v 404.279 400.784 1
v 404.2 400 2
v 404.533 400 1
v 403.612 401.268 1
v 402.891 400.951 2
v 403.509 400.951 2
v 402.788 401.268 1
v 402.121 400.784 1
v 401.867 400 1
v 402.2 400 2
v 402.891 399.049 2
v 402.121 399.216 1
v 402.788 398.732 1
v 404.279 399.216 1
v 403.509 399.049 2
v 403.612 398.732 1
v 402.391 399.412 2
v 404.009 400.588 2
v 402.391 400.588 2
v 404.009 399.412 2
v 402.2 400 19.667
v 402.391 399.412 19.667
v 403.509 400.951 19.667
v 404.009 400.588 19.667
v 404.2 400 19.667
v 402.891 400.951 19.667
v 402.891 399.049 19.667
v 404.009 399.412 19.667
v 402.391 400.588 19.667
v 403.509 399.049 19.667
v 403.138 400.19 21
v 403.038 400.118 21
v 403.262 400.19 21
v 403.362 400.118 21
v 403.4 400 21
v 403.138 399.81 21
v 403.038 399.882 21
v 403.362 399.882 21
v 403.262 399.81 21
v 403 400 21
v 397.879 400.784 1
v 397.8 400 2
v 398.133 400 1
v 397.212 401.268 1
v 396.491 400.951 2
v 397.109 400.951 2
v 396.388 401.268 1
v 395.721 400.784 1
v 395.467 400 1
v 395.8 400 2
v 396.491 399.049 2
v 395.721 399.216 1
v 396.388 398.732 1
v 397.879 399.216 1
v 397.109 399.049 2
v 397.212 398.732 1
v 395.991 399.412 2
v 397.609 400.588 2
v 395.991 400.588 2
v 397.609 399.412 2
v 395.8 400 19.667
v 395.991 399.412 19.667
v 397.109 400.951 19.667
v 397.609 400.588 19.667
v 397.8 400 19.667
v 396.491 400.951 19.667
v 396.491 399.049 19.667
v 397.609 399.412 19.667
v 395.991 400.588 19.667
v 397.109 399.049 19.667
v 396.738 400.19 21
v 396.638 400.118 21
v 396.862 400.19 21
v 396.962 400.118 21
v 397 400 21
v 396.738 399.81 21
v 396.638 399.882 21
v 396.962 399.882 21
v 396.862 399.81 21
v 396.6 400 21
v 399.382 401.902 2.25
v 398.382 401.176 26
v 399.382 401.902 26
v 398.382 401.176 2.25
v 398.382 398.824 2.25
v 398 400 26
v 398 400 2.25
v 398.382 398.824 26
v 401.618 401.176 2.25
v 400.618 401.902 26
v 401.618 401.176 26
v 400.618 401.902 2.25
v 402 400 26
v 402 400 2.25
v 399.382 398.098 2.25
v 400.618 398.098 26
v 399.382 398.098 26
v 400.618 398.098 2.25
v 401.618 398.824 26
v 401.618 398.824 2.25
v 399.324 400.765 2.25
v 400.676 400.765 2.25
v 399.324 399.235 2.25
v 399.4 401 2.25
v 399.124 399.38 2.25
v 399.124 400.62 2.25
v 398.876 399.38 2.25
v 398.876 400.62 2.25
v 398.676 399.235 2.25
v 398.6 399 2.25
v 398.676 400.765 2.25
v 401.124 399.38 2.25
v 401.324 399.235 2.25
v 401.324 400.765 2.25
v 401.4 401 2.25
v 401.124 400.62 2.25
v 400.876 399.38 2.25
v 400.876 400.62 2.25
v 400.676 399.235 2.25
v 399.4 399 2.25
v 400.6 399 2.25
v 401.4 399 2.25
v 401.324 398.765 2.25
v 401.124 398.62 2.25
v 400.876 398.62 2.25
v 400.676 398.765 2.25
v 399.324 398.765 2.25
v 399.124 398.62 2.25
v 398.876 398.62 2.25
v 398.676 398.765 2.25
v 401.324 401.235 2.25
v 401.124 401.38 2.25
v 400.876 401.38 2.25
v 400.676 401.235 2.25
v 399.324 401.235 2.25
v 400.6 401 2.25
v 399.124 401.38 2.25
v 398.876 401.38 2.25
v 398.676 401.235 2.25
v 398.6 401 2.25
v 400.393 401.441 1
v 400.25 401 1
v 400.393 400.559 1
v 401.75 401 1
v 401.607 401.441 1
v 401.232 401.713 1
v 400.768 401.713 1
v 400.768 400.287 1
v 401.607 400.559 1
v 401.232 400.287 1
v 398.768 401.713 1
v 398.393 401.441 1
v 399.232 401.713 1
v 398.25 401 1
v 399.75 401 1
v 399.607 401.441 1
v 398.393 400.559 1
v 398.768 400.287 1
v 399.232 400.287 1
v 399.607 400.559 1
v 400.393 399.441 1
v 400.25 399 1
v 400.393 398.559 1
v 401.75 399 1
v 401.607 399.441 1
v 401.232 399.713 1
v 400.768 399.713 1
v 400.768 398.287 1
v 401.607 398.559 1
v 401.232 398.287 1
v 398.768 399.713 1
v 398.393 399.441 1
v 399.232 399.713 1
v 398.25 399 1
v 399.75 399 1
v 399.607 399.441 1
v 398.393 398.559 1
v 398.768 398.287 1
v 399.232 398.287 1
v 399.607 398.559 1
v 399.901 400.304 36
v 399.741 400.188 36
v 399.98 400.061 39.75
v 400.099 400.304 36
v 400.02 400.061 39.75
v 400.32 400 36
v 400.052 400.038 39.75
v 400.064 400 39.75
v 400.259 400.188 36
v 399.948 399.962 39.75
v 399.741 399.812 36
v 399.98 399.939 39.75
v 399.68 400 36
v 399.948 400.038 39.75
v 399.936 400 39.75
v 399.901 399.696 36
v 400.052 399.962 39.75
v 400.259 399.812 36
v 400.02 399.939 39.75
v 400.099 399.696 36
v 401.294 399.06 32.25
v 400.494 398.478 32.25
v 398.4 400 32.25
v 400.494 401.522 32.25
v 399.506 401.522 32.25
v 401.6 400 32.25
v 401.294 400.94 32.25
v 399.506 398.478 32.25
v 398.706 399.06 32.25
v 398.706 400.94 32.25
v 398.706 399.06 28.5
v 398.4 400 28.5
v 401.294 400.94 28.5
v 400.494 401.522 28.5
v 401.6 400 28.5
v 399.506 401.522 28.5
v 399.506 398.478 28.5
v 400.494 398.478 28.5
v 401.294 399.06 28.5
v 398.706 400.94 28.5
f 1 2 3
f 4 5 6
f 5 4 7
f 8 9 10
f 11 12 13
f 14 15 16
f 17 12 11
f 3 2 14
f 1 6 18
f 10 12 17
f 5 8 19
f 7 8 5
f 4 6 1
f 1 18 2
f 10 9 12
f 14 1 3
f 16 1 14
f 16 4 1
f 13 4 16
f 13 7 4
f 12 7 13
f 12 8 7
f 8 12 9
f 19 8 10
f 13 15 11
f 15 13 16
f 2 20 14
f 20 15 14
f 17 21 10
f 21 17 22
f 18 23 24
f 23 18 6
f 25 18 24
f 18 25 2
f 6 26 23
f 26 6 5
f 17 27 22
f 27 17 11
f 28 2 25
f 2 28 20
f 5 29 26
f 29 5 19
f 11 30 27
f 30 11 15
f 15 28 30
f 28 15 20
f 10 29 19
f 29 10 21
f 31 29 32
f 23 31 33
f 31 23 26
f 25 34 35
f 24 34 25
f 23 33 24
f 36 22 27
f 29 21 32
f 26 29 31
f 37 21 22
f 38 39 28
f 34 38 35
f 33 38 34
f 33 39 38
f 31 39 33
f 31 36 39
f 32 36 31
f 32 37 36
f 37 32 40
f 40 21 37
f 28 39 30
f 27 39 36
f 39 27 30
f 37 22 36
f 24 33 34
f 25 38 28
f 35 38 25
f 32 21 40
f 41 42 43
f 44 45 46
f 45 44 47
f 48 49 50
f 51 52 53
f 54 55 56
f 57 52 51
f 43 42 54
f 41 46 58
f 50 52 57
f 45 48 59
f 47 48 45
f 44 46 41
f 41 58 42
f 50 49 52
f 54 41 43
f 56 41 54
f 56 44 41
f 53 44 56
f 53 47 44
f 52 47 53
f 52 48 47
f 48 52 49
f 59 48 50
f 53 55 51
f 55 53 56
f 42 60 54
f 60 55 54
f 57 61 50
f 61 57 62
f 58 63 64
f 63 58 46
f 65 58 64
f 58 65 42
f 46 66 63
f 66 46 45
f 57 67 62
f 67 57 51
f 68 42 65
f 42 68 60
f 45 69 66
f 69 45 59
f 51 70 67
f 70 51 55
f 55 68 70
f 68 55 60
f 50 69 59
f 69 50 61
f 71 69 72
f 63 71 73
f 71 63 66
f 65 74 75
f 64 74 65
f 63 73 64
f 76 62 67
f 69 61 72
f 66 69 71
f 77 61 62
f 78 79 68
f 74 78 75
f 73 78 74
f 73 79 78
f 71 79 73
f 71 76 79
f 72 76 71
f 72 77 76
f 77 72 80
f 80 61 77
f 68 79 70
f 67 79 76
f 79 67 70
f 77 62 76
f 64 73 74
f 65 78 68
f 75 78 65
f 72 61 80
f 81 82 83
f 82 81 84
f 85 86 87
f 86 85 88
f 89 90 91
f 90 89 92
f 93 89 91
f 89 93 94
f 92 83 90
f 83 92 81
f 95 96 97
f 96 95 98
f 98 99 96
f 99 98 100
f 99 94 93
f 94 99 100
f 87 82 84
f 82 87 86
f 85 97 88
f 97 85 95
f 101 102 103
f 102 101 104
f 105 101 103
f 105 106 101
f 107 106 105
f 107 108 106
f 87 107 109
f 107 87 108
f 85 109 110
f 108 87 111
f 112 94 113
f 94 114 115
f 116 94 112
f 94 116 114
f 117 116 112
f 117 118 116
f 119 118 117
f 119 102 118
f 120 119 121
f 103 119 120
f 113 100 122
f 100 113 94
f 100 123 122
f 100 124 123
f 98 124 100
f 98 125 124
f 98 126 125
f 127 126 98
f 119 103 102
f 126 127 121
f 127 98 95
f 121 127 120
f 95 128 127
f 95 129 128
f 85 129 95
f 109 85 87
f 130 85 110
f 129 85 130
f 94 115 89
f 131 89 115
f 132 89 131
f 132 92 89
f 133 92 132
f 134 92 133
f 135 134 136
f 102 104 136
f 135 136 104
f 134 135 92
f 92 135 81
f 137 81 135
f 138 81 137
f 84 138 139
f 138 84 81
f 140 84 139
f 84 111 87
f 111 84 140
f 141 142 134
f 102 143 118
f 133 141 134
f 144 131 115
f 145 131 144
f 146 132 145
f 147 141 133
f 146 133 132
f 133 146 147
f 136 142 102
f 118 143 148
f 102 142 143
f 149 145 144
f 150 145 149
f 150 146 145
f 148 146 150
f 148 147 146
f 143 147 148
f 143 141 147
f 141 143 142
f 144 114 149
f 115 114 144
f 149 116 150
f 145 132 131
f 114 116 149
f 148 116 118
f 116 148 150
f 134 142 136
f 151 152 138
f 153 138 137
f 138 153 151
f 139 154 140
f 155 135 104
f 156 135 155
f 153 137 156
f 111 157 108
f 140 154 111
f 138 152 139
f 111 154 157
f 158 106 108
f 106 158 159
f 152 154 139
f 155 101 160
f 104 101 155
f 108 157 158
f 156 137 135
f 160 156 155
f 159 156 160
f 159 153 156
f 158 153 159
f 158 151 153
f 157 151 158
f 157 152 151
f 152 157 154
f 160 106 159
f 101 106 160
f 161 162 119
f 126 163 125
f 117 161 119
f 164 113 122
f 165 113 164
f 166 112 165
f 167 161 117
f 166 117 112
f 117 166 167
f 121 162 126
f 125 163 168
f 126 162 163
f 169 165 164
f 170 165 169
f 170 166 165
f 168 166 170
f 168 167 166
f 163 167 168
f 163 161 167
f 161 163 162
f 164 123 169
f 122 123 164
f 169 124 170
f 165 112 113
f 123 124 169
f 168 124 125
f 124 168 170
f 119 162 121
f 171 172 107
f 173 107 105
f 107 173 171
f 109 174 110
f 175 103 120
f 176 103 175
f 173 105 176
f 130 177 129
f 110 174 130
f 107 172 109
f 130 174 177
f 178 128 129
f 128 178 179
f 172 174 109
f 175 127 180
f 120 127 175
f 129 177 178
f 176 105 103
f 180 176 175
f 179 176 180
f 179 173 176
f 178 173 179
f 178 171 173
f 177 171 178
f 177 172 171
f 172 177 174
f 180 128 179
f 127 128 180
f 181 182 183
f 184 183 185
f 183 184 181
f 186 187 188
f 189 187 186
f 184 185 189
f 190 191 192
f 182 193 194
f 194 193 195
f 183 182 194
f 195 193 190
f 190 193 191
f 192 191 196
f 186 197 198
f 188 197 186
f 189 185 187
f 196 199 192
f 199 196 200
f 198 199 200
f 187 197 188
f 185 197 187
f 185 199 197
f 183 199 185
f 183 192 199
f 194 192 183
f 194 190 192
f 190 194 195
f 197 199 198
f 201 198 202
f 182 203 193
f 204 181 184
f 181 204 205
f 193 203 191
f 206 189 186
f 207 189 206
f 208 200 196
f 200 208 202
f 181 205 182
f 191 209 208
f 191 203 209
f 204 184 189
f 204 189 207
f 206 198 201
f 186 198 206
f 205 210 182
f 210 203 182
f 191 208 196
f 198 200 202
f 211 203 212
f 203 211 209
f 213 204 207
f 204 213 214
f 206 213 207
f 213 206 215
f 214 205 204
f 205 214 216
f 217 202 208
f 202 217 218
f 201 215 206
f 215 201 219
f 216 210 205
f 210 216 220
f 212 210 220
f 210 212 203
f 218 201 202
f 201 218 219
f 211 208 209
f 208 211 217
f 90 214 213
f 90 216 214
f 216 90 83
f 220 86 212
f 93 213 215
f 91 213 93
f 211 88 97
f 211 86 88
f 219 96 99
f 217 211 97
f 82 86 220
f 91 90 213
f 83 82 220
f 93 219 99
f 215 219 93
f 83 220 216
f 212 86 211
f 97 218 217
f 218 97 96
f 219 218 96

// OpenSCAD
$fn = 10;

room_size_x = 80;
room_size_y = 80;
room_size_z = 80;
module room(){
union(){
translate([-room_size_x,0,0])
cube([room_size_x,1,room_size_z]);
translate([0,-room_size_y,0])
cube([1,room_size_y,room_size_z]);
translate([-room_size_x,-room_size_y,0])
cube([room_size_x,room_size_y,1]);
}
}

module booster(h, r) {
// cone + tube + cone
 booster_bottom_h = h/20;
 booster_pointy_h = h/15;
 tube_h = h - booster_bottom_h - booster_pointy_h;
 
 union(){
 color("grey")
 cylinder(booster_bottom_h,r+r/3,r); 
 
 color("white") 
 translate([0,0,booster_bottom_h])
 cylinder(tube_h,r,r);
 
 color("white")
 translate([0,0,booster_bottom_h+tube_h])
 cylinder(booster_pointy_h, r, r*0.2);
 }
};

module core_orion_connector(h, r1, r2){
   color("darkorange")
   cylinder(h, r1, r2);
}

module core_stage(h, r) {
 // motors + fuel cylinder
 motors_h = h/20;
 pre_motors_h = h/10;
 core_tube_h = h - motors_h - pre_motors_h;
 
 translate([0,0,motors_h])
 union(){
 translate([0,0,pre_motors_h]){
 color("orange")
 cylinder(core_tube_h,r,r);
 }
 color("white")
 cylinder(pre_motors_h, r,r);
 }
 
 // 4x engines
 union(){
 translate([r/2,r/2,0])
 rs_25_engine(motors_h, r/5);
  translate([-r/2,r/2,0])
 rs_25_engine(motors_h, r/5);
  translate([r/2,-r/2,0])
 rs_25_engine(motors_h, r/5);
  translate([-r/2,-r/2,0])
 rs_25_engine(motors_h, r/5);
 }
};

module rs_25_engine(h,r) {
   color([0.2,0.2,0.2])
   cylinder(h,r+0.35,r);
};

module orion(h,r1,r2) {
  orion_conn_h = h*0.5;
  orion_base_h = h - orion_conn_h;
  
  color("white")
  union(){
    translate([0,0,orion_base_h+orion_conn_h])
    cylinder(orion_conn_h, r2,r2*0.2);
    translate([0,0,orion_base_h])
    cylinder(orion_conn_h, r1,r2);
    cylinder(orion_base_h,r1,r1);
  }
};

core_h=25;
core_r = 2;

core_orion_h = core_h * 0.1;
core_orion_r1 = core_r;
core_orion_r2 = core_r*0.8;

orion_h = core_h*0.3;
orion_r1 = core_orion_r2;
orion_r2 = core_orion_r2*0.2;

translate([400,400,$t*50+1])
union(){
translate([3.2,0,0])
booster(20,1);

translate([-3.2,0,0])
booster(20,1);

core_stage(core_h,core_r);

translate([0,0,core_h])
core_orion_connector(core_orion_h,core_orion_r1, core_orion_r2);

translate([0,0,core_h + core_orion_h])
orion(orion_h, orion_r1, orion_r2);
}

//color("lightyellow")
//cube([1000,1000,1]);
